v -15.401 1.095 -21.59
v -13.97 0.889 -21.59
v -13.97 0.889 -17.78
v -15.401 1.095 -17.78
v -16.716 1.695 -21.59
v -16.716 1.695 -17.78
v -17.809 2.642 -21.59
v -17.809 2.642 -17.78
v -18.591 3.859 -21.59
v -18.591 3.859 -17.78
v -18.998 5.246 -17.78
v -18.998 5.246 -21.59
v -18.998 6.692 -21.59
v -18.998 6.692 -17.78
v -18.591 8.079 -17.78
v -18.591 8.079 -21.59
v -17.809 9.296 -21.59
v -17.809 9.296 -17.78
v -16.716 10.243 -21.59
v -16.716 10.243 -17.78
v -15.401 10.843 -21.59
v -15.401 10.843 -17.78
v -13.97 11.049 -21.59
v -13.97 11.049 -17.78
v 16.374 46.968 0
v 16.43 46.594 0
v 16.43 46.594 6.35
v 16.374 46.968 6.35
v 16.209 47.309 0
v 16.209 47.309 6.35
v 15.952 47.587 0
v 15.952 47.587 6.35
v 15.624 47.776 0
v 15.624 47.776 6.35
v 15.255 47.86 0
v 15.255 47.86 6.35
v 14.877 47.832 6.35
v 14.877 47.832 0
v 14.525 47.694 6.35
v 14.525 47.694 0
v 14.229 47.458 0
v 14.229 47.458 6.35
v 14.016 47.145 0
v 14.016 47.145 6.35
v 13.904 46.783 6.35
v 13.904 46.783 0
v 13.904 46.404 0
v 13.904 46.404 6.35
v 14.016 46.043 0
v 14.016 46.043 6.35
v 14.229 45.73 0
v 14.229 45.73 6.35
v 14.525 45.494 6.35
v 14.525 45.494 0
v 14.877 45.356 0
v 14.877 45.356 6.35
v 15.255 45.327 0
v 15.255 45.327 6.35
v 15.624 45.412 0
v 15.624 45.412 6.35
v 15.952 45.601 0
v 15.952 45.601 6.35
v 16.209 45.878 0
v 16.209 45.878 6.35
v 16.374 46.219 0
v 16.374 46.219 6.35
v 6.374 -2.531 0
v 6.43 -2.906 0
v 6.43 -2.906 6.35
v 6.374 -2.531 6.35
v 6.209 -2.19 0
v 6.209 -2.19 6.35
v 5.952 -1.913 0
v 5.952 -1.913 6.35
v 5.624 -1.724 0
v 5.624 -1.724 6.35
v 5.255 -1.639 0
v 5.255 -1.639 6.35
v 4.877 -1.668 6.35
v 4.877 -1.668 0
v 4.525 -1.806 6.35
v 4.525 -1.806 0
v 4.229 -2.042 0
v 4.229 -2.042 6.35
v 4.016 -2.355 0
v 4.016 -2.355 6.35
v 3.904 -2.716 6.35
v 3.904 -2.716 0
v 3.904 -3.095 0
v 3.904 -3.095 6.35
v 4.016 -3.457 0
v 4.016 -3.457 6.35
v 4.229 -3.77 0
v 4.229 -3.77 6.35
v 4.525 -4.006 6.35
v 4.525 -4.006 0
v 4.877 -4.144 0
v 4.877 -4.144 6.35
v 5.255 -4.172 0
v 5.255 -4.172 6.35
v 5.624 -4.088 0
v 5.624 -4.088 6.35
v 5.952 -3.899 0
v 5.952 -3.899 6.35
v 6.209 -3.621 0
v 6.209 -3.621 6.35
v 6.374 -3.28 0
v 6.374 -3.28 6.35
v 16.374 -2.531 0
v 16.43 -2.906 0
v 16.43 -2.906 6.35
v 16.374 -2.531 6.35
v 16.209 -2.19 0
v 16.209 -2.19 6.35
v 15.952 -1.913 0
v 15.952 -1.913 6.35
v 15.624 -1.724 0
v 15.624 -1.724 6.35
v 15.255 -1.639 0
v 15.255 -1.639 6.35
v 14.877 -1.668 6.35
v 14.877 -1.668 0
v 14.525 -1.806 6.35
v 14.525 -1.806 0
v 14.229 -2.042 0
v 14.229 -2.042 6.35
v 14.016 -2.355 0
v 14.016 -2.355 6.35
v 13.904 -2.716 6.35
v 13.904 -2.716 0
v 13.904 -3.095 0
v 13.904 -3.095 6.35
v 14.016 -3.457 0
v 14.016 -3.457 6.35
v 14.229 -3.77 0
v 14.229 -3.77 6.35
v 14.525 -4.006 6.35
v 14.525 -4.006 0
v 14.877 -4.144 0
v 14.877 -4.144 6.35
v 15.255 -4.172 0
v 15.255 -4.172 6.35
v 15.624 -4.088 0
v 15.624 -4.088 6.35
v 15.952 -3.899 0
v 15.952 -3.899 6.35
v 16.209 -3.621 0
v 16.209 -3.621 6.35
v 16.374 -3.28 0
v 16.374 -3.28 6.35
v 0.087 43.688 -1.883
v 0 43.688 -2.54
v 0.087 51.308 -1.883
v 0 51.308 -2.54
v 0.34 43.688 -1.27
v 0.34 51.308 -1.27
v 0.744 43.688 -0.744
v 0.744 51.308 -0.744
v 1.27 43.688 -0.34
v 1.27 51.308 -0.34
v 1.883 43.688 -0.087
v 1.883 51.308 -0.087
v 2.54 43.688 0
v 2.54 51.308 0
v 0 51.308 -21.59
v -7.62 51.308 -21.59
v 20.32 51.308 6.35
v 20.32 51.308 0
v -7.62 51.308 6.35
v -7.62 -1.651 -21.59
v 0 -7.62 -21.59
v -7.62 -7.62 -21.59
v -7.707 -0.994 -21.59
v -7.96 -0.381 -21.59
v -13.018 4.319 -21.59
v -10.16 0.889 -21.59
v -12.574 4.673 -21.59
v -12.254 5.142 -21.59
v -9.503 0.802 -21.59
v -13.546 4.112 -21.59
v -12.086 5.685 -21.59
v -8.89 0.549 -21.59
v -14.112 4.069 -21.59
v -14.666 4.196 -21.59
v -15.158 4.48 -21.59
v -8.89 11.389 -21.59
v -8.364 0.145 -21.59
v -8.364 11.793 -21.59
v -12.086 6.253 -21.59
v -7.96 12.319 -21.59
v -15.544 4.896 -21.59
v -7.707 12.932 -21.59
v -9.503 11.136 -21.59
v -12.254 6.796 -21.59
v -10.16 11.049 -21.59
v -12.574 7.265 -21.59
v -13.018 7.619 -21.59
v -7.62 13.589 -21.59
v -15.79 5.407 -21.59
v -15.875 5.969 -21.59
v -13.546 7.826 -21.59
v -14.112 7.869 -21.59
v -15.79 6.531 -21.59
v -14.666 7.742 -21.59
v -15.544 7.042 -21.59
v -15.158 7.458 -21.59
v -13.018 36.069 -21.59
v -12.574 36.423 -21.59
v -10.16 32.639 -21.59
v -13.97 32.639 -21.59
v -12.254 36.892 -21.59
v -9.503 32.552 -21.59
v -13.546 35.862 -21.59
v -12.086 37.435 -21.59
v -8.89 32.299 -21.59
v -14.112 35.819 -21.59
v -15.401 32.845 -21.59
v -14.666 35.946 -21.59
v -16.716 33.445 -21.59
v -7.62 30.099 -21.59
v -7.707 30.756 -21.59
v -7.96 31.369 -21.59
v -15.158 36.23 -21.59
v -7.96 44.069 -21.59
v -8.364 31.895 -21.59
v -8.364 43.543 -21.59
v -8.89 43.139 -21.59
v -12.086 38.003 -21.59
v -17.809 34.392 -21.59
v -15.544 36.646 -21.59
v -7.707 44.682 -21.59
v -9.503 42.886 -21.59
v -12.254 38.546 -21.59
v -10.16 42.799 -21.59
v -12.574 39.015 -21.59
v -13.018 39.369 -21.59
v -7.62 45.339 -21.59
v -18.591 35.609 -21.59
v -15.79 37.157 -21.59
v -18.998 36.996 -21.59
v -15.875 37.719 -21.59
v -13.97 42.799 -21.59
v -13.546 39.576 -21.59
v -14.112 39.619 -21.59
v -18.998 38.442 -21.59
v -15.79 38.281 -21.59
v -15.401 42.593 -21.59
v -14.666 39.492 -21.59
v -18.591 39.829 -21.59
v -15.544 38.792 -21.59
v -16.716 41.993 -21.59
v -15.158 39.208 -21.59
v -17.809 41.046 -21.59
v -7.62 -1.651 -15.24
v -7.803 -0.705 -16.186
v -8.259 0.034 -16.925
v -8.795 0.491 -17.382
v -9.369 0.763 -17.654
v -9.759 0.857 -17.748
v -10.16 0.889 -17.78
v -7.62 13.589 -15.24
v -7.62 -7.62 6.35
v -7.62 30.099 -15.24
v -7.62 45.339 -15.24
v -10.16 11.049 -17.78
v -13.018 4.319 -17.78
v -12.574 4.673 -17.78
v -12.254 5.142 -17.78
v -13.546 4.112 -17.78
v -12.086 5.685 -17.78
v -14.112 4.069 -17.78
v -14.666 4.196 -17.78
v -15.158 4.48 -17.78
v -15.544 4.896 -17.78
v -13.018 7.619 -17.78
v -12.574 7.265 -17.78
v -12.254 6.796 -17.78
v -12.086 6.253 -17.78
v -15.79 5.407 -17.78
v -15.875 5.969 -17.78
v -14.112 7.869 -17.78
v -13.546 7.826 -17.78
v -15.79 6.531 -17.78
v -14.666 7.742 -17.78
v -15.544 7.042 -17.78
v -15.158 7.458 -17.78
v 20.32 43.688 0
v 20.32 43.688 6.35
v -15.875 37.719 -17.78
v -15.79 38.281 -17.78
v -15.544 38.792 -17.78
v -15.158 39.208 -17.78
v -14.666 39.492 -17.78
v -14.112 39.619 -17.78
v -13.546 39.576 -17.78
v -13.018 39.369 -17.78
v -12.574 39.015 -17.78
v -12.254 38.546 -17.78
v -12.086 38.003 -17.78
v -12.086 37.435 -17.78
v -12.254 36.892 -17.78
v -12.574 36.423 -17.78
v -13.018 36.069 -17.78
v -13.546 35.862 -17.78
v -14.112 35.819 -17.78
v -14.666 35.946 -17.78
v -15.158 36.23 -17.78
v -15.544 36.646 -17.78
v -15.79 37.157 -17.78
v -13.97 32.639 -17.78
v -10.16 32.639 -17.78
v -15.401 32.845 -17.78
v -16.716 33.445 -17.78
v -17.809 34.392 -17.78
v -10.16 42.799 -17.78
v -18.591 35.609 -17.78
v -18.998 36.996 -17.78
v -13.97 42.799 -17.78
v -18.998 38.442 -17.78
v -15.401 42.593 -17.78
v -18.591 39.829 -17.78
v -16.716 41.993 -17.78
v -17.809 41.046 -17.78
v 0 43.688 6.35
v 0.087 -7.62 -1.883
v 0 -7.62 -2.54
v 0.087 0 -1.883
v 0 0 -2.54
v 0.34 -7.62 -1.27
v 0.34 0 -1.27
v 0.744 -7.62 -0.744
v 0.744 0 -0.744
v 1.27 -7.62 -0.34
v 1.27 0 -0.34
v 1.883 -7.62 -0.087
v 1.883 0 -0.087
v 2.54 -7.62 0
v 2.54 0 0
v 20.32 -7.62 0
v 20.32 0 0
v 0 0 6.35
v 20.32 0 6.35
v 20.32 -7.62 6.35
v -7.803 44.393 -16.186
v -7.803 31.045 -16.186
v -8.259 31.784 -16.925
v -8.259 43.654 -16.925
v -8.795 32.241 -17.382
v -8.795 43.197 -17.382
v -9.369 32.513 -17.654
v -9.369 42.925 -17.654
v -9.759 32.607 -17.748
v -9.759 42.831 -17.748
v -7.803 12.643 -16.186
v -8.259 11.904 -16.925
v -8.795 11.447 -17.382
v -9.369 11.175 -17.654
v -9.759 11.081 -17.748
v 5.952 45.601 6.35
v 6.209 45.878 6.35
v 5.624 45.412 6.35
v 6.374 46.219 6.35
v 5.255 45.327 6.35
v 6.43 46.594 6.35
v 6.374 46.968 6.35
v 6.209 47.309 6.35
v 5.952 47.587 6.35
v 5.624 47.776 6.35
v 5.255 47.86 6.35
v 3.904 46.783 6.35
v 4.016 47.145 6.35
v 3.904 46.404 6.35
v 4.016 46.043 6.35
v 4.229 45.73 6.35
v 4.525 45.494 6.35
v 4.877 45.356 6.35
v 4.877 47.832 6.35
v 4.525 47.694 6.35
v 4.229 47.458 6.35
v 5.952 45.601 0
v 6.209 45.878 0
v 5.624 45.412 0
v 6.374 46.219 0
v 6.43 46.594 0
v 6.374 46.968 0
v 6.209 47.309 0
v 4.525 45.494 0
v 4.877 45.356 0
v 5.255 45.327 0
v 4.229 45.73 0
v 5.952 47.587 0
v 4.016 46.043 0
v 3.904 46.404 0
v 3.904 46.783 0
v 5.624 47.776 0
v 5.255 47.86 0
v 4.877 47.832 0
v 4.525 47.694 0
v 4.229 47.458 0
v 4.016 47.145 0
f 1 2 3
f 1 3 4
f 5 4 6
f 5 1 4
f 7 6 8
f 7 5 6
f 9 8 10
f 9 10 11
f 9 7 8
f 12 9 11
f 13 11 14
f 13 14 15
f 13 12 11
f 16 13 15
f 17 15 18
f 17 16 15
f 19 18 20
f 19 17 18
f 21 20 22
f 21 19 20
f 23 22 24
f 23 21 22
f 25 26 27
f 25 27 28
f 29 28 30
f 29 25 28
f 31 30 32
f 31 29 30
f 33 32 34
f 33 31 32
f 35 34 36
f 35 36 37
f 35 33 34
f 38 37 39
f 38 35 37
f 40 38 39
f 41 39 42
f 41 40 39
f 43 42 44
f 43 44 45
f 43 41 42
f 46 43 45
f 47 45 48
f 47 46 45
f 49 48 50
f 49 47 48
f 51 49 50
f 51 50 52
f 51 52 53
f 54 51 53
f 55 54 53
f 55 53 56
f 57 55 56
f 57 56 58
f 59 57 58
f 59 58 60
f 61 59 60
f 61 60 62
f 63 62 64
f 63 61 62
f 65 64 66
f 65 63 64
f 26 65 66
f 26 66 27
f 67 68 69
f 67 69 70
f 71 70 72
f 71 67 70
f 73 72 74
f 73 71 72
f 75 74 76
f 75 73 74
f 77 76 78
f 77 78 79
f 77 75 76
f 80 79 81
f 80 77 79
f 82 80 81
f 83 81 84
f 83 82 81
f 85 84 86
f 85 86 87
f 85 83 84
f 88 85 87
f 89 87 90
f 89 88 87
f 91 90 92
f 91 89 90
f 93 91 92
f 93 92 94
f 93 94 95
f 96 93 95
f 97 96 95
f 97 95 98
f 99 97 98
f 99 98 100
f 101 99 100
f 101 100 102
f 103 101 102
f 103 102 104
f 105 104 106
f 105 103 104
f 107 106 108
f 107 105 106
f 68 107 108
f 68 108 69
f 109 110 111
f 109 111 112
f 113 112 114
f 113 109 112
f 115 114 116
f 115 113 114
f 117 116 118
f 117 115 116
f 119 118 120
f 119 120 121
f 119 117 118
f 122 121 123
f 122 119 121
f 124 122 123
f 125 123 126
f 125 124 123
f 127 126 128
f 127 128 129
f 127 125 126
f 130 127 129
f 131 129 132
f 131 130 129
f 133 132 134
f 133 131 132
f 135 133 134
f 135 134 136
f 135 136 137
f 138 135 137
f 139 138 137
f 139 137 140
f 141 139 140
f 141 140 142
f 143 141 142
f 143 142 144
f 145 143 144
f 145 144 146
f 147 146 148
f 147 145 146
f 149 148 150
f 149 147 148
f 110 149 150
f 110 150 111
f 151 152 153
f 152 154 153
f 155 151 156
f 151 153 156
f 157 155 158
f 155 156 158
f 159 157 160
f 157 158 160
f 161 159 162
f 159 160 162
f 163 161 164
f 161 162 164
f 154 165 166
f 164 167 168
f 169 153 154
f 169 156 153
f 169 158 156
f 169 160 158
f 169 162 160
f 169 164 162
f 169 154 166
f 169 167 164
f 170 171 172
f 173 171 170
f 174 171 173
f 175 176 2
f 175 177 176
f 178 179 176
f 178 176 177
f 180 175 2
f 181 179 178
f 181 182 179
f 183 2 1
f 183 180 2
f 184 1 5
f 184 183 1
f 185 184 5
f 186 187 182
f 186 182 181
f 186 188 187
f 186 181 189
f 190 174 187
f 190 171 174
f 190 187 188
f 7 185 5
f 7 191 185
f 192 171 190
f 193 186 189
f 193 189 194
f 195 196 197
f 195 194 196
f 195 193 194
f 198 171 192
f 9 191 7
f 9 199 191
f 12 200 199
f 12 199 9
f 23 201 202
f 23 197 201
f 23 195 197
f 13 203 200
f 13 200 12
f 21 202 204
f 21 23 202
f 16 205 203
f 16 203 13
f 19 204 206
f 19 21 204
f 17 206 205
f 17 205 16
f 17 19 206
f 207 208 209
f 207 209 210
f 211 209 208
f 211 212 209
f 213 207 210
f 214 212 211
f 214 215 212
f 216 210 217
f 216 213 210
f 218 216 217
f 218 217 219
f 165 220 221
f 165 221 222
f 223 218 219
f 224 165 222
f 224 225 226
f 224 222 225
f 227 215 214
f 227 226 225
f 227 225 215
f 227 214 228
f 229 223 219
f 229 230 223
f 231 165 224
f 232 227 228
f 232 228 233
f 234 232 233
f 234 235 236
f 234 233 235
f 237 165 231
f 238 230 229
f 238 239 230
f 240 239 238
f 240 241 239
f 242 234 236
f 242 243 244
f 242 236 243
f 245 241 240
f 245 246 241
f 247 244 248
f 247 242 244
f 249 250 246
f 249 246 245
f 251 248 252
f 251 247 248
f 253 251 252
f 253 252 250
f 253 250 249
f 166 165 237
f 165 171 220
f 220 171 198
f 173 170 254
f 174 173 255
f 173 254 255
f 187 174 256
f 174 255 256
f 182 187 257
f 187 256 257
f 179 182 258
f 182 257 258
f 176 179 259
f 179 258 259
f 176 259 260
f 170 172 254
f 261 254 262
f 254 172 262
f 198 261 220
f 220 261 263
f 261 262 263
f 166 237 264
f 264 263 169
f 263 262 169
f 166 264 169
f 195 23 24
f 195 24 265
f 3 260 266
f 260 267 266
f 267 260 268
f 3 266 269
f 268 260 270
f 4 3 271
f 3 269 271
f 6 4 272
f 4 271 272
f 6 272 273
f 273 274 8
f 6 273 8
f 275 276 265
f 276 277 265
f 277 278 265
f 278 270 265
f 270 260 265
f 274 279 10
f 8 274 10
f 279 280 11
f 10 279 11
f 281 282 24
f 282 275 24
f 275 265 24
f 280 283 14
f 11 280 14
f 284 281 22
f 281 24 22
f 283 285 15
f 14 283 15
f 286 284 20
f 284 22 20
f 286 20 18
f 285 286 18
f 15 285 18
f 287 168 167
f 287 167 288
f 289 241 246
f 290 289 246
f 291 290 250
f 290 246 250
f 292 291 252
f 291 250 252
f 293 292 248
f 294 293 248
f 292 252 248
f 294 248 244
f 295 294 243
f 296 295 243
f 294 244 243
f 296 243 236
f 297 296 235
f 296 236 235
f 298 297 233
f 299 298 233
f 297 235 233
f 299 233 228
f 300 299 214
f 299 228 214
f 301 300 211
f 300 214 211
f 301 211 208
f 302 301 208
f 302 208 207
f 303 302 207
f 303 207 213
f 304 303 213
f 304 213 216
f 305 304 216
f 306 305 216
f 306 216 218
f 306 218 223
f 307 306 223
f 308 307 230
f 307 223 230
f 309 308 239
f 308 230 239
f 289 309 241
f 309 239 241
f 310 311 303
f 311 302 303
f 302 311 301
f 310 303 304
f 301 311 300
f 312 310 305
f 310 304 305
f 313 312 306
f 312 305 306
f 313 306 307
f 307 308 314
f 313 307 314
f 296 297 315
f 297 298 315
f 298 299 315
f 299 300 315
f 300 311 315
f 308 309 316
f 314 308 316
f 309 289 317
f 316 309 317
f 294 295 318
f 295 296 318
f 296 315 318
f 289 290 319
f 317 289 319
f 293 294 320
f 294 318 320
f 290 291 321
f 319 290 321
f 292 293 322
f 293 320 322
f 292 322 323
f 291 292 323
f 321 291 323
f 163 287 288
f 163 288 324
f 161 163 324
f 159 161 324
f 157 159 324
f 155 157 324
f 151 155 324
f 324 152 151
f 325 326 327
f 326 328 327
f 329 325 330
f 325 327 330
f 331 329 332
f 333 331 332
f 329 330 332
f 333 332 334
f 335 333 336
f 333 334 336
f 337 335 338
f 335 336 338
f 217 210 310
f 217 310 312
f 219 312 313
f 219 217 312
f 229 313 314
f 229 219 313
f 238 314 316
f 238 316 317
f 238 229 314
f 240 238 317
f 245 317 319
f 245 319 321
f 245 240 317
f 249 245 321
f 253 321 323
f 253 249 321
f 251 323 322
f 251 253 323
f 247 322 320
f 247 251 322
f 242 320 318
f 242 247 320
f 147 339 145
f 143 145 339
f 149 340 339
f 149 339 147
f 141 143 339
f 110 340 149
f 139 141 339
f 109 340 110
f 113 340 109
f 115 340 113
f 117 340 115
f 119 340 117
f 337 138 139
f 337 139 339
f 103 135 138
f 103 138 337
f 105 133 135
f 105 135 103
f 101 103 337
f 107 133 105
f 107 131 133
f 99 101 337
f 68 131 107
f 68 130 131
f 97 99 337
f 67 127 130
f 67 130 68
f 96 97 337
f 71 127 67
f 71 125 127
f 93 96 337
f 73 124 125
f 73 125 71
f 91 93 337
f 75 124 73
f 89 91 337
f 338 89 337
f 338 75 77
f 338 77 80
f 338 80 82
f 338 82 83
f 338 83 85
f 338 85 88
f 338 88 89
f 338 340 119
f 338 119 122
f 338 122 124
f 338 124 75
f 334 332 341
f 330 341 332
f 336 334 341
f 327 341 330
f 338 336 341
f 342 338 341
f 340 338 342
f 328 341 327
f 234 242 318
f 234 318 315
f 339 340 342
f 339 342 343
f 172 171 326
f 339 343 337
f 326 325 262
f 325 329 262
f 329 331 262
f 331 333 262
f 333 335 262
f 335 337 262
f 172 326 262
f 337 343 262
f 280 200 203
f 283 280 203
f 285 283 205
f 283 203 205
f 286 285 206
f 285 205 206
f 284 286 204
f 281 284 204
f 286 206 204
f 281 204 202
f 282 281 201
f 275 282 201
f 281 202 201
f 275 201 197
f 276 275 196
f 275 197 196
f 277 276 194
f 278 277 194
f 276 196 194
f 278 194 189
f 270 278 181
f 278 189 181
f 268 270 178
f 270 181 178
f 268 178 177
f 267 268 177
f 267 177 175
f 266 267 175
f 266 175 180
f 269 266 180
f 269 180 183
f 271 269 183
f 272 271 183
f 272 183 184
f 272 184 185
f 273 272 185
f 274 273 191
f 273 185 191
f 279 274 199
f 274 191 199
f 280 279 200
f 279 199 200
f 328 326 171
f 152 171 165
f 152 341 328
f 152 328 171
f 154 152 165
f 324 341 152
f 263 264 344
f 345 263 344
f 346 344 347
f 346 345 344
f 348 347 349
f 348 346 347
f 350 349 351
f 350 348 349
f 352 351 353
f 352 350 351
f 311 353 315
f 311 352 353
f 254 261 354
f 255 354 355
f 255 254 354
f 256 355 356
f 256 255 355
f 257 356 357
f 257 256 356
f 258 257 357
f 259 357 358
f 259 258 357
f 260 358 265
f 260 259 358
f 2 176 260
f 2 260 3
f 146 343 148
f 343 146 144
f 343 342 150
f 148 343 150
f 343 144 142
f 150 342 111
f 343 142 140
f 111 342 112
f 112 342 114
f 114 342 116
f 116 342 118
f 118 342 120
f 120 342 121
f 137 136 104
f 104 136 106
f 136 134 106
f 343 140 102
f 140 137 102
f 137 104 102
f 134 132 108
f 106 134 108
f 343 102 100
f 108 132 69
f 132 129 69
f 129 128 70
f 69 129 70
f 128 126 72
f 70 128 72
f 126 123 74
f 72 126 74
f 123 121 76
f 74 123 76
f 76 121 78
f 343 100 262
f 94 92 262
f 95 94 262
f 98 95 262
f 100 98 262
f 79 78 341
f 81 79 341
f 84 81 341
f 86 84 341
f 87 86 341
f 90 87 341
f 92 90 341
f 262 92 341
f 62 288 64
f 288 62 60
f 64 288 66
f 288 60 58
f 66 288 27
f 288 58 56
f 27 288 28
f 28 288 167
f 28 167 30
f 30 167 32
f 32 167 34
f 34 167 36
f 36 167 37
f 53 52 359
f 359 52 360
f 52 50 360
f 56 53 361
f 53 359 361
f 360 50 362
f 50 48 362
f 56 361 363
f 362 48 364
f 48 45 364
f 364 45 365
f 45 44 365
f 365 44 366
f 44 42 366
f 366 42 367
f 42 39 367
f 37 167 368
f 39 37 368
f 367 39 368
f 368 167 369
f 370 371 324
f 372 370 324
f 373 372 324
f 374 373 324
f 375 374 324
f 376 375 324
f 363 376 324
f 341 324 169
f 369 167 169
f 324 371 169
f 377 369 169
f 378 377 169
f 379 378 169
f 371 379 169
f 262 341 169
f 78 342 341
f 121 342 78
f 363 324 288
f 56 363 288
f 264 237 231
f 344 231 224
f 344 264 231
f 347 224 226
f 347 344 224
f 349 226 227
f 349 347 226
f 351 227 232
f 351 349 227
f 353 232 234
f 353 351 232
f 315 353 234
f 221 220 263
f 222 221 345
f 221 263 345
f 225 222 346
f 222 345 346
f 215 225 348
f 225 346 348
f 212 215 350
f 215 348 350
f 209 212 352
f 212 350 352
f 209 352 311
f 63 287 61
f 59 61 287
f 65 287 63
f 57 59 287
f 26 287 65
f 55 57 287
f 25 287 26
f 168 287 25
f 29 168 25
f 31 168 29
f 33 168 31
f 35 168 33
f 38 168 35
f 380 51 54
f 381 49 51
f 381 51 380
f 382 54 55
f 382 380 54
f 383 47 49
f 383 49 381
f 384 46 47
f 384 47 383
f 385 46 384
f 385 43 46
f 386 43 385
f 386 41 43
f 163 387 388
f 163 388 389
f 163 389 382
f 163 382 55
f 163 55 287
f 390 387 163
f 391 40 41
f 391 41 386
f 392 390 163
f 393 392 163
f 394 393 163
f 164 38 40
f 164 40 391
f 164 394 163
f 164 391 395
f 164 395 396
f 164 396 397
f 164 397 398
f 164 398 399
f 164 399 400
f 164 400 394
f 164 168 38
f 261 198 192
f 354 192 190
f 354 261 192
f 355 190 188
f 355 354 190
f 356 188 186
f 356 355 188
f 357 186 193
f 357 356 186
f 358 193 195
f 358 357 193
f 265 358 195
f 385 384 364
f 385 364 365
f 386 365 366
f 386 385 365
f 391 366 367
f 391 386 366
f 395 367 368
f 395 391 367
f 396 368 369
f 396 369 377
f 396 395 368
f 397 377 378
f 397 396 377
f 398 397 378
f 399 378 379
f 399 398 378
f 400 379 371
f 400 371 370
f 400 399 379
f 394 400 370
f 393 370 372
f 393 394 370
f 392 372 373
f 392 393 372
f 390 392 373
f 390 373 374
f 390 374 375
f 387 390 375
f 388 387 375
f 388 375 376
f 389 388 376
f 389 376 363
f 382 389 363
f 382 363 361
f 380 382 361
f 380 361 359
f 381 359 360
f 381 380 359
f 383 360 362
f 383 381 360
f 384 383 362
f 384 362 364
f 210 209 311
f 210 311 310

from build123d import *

# Parameters (mm, degrees)
SKETCH1_R           = 1.27
BOSS_EXTRUDE1_DEPTH = 6.35
SKETCH2_W           = 7.62
SKETCH2_H           = 58.928
BOSS_EXTRUDE2_DEPTH = 21.59
SKETCH3_R           = 1.905
BOSS_EXTRUDE3_DEPTH = 3.81
FILLET1_R           = 2.54


with BuildPart() as part:
    # Sketch1 → Boss-Extrude1 (new body)
    with BuildSketch(Plane.XY):
        Polygon((0, 0), (20.32, 0), (20.32, -7.62), (-7.62, -7.62), (-7.62, 51.308), (20.32, 51.308), (20.32, 43.688), (0, 43.688), align=None)
        with Locations((5.16001, 46.59376)):
            Circle(SKETCH1_R, mode=Mode.SUBTRACT)
        with Locations((15.15999, 46.59376)):
            Circle(SKETCH1_R, mode=Mode.SUBTRACT)
        with Locations((5.16001, -2.90576)):
            Circle(SKETCH1_R, mode=Mode.SUBTRACT)
        with Locations((15.15999, -2.90576)):
            Circle(SKETCH1_R, mode=Mode.SUBTRACT)
    extrude(amount=BOSS_EXTRUDE1_DEPTH)

    # Sketch2 → Boss-Extrude2 (add)
    with BuildSketch(Plane(origin=(0, 0, 0), x_dir=(-1, 0, 0), z_dir=(0, 0, -1))):
        with Locations((3.81, 21.844)):
            Rectangle(SKETCH2_W, SKETCH2_H)
    extrude(amount=BOSS_EXTRUDE2_DEPTH)

    # Sketch3 → Boss-Extrude3 (add)
    # profile 1 of 2: a face of its own
    with BuildSketch(Plane(origin=(0, 0, -21.59), x_dir=(-1, 0, 0), z_dir=(0, 0, -1))):
        with BuildLine():
            Line((13.97, 42.799), (7.62, 42.799))
            Line((7.62, 42.799), (7.62, 32.639))
            Line((7.62, 32.639), (13.97, 32.639))
            ThreePointArc((13.97, 32.639), (19.05, 37.719), (13.97, 42.799))
        make_face()
        with Locations((13.97, 37.719)):
            Circle(SKETCH3_R, mode=Mode.SUBTRACT)
    # profile 2 of 2: a face of its own
    with BuildSketch(Plane(origin=(0, 0, -21.59), x_dir=(-1, 0, 0), z_dir=(0, 0, -1))):
        with BuildLine():
            Line((13.97, 11.049), (7.62, 11.049))
            Line((7.62, 11.049), (7.62, 0.889))
            Line((7.62, 0.889), (13.97, 0.889))
            ThreePointArc((13.97, 0.889), (19.05, 5.969), (13.97, 11.049))
        make_face()
        with Locations((13.97, 5.969)):
            Circle(SKETCH3_R, mode=Mode.SUBTRACT)
    extrude(amount=-BOSS_EXTRUDE3_DEPTH)

    # Fillet1
    fillet1_edges = [part.edges().sort_by_distance(p)[0] for p in [
        (0, -3.81, 0),
        (0, 47.498, 0),
        (-7.62, 37.719, -17.78),
        (-7.62, 32.639, -19.685),
        (-7.62, 42.799, -19.685),
        (-7.62, 5.969, -17.78),
        (-7.62, 0.889, -19.685),
        (-7.62, 11.049, -19.685),
    ]]
    fillet(fillet1_edges, radius=FILLET1_R)


solid = part.part
